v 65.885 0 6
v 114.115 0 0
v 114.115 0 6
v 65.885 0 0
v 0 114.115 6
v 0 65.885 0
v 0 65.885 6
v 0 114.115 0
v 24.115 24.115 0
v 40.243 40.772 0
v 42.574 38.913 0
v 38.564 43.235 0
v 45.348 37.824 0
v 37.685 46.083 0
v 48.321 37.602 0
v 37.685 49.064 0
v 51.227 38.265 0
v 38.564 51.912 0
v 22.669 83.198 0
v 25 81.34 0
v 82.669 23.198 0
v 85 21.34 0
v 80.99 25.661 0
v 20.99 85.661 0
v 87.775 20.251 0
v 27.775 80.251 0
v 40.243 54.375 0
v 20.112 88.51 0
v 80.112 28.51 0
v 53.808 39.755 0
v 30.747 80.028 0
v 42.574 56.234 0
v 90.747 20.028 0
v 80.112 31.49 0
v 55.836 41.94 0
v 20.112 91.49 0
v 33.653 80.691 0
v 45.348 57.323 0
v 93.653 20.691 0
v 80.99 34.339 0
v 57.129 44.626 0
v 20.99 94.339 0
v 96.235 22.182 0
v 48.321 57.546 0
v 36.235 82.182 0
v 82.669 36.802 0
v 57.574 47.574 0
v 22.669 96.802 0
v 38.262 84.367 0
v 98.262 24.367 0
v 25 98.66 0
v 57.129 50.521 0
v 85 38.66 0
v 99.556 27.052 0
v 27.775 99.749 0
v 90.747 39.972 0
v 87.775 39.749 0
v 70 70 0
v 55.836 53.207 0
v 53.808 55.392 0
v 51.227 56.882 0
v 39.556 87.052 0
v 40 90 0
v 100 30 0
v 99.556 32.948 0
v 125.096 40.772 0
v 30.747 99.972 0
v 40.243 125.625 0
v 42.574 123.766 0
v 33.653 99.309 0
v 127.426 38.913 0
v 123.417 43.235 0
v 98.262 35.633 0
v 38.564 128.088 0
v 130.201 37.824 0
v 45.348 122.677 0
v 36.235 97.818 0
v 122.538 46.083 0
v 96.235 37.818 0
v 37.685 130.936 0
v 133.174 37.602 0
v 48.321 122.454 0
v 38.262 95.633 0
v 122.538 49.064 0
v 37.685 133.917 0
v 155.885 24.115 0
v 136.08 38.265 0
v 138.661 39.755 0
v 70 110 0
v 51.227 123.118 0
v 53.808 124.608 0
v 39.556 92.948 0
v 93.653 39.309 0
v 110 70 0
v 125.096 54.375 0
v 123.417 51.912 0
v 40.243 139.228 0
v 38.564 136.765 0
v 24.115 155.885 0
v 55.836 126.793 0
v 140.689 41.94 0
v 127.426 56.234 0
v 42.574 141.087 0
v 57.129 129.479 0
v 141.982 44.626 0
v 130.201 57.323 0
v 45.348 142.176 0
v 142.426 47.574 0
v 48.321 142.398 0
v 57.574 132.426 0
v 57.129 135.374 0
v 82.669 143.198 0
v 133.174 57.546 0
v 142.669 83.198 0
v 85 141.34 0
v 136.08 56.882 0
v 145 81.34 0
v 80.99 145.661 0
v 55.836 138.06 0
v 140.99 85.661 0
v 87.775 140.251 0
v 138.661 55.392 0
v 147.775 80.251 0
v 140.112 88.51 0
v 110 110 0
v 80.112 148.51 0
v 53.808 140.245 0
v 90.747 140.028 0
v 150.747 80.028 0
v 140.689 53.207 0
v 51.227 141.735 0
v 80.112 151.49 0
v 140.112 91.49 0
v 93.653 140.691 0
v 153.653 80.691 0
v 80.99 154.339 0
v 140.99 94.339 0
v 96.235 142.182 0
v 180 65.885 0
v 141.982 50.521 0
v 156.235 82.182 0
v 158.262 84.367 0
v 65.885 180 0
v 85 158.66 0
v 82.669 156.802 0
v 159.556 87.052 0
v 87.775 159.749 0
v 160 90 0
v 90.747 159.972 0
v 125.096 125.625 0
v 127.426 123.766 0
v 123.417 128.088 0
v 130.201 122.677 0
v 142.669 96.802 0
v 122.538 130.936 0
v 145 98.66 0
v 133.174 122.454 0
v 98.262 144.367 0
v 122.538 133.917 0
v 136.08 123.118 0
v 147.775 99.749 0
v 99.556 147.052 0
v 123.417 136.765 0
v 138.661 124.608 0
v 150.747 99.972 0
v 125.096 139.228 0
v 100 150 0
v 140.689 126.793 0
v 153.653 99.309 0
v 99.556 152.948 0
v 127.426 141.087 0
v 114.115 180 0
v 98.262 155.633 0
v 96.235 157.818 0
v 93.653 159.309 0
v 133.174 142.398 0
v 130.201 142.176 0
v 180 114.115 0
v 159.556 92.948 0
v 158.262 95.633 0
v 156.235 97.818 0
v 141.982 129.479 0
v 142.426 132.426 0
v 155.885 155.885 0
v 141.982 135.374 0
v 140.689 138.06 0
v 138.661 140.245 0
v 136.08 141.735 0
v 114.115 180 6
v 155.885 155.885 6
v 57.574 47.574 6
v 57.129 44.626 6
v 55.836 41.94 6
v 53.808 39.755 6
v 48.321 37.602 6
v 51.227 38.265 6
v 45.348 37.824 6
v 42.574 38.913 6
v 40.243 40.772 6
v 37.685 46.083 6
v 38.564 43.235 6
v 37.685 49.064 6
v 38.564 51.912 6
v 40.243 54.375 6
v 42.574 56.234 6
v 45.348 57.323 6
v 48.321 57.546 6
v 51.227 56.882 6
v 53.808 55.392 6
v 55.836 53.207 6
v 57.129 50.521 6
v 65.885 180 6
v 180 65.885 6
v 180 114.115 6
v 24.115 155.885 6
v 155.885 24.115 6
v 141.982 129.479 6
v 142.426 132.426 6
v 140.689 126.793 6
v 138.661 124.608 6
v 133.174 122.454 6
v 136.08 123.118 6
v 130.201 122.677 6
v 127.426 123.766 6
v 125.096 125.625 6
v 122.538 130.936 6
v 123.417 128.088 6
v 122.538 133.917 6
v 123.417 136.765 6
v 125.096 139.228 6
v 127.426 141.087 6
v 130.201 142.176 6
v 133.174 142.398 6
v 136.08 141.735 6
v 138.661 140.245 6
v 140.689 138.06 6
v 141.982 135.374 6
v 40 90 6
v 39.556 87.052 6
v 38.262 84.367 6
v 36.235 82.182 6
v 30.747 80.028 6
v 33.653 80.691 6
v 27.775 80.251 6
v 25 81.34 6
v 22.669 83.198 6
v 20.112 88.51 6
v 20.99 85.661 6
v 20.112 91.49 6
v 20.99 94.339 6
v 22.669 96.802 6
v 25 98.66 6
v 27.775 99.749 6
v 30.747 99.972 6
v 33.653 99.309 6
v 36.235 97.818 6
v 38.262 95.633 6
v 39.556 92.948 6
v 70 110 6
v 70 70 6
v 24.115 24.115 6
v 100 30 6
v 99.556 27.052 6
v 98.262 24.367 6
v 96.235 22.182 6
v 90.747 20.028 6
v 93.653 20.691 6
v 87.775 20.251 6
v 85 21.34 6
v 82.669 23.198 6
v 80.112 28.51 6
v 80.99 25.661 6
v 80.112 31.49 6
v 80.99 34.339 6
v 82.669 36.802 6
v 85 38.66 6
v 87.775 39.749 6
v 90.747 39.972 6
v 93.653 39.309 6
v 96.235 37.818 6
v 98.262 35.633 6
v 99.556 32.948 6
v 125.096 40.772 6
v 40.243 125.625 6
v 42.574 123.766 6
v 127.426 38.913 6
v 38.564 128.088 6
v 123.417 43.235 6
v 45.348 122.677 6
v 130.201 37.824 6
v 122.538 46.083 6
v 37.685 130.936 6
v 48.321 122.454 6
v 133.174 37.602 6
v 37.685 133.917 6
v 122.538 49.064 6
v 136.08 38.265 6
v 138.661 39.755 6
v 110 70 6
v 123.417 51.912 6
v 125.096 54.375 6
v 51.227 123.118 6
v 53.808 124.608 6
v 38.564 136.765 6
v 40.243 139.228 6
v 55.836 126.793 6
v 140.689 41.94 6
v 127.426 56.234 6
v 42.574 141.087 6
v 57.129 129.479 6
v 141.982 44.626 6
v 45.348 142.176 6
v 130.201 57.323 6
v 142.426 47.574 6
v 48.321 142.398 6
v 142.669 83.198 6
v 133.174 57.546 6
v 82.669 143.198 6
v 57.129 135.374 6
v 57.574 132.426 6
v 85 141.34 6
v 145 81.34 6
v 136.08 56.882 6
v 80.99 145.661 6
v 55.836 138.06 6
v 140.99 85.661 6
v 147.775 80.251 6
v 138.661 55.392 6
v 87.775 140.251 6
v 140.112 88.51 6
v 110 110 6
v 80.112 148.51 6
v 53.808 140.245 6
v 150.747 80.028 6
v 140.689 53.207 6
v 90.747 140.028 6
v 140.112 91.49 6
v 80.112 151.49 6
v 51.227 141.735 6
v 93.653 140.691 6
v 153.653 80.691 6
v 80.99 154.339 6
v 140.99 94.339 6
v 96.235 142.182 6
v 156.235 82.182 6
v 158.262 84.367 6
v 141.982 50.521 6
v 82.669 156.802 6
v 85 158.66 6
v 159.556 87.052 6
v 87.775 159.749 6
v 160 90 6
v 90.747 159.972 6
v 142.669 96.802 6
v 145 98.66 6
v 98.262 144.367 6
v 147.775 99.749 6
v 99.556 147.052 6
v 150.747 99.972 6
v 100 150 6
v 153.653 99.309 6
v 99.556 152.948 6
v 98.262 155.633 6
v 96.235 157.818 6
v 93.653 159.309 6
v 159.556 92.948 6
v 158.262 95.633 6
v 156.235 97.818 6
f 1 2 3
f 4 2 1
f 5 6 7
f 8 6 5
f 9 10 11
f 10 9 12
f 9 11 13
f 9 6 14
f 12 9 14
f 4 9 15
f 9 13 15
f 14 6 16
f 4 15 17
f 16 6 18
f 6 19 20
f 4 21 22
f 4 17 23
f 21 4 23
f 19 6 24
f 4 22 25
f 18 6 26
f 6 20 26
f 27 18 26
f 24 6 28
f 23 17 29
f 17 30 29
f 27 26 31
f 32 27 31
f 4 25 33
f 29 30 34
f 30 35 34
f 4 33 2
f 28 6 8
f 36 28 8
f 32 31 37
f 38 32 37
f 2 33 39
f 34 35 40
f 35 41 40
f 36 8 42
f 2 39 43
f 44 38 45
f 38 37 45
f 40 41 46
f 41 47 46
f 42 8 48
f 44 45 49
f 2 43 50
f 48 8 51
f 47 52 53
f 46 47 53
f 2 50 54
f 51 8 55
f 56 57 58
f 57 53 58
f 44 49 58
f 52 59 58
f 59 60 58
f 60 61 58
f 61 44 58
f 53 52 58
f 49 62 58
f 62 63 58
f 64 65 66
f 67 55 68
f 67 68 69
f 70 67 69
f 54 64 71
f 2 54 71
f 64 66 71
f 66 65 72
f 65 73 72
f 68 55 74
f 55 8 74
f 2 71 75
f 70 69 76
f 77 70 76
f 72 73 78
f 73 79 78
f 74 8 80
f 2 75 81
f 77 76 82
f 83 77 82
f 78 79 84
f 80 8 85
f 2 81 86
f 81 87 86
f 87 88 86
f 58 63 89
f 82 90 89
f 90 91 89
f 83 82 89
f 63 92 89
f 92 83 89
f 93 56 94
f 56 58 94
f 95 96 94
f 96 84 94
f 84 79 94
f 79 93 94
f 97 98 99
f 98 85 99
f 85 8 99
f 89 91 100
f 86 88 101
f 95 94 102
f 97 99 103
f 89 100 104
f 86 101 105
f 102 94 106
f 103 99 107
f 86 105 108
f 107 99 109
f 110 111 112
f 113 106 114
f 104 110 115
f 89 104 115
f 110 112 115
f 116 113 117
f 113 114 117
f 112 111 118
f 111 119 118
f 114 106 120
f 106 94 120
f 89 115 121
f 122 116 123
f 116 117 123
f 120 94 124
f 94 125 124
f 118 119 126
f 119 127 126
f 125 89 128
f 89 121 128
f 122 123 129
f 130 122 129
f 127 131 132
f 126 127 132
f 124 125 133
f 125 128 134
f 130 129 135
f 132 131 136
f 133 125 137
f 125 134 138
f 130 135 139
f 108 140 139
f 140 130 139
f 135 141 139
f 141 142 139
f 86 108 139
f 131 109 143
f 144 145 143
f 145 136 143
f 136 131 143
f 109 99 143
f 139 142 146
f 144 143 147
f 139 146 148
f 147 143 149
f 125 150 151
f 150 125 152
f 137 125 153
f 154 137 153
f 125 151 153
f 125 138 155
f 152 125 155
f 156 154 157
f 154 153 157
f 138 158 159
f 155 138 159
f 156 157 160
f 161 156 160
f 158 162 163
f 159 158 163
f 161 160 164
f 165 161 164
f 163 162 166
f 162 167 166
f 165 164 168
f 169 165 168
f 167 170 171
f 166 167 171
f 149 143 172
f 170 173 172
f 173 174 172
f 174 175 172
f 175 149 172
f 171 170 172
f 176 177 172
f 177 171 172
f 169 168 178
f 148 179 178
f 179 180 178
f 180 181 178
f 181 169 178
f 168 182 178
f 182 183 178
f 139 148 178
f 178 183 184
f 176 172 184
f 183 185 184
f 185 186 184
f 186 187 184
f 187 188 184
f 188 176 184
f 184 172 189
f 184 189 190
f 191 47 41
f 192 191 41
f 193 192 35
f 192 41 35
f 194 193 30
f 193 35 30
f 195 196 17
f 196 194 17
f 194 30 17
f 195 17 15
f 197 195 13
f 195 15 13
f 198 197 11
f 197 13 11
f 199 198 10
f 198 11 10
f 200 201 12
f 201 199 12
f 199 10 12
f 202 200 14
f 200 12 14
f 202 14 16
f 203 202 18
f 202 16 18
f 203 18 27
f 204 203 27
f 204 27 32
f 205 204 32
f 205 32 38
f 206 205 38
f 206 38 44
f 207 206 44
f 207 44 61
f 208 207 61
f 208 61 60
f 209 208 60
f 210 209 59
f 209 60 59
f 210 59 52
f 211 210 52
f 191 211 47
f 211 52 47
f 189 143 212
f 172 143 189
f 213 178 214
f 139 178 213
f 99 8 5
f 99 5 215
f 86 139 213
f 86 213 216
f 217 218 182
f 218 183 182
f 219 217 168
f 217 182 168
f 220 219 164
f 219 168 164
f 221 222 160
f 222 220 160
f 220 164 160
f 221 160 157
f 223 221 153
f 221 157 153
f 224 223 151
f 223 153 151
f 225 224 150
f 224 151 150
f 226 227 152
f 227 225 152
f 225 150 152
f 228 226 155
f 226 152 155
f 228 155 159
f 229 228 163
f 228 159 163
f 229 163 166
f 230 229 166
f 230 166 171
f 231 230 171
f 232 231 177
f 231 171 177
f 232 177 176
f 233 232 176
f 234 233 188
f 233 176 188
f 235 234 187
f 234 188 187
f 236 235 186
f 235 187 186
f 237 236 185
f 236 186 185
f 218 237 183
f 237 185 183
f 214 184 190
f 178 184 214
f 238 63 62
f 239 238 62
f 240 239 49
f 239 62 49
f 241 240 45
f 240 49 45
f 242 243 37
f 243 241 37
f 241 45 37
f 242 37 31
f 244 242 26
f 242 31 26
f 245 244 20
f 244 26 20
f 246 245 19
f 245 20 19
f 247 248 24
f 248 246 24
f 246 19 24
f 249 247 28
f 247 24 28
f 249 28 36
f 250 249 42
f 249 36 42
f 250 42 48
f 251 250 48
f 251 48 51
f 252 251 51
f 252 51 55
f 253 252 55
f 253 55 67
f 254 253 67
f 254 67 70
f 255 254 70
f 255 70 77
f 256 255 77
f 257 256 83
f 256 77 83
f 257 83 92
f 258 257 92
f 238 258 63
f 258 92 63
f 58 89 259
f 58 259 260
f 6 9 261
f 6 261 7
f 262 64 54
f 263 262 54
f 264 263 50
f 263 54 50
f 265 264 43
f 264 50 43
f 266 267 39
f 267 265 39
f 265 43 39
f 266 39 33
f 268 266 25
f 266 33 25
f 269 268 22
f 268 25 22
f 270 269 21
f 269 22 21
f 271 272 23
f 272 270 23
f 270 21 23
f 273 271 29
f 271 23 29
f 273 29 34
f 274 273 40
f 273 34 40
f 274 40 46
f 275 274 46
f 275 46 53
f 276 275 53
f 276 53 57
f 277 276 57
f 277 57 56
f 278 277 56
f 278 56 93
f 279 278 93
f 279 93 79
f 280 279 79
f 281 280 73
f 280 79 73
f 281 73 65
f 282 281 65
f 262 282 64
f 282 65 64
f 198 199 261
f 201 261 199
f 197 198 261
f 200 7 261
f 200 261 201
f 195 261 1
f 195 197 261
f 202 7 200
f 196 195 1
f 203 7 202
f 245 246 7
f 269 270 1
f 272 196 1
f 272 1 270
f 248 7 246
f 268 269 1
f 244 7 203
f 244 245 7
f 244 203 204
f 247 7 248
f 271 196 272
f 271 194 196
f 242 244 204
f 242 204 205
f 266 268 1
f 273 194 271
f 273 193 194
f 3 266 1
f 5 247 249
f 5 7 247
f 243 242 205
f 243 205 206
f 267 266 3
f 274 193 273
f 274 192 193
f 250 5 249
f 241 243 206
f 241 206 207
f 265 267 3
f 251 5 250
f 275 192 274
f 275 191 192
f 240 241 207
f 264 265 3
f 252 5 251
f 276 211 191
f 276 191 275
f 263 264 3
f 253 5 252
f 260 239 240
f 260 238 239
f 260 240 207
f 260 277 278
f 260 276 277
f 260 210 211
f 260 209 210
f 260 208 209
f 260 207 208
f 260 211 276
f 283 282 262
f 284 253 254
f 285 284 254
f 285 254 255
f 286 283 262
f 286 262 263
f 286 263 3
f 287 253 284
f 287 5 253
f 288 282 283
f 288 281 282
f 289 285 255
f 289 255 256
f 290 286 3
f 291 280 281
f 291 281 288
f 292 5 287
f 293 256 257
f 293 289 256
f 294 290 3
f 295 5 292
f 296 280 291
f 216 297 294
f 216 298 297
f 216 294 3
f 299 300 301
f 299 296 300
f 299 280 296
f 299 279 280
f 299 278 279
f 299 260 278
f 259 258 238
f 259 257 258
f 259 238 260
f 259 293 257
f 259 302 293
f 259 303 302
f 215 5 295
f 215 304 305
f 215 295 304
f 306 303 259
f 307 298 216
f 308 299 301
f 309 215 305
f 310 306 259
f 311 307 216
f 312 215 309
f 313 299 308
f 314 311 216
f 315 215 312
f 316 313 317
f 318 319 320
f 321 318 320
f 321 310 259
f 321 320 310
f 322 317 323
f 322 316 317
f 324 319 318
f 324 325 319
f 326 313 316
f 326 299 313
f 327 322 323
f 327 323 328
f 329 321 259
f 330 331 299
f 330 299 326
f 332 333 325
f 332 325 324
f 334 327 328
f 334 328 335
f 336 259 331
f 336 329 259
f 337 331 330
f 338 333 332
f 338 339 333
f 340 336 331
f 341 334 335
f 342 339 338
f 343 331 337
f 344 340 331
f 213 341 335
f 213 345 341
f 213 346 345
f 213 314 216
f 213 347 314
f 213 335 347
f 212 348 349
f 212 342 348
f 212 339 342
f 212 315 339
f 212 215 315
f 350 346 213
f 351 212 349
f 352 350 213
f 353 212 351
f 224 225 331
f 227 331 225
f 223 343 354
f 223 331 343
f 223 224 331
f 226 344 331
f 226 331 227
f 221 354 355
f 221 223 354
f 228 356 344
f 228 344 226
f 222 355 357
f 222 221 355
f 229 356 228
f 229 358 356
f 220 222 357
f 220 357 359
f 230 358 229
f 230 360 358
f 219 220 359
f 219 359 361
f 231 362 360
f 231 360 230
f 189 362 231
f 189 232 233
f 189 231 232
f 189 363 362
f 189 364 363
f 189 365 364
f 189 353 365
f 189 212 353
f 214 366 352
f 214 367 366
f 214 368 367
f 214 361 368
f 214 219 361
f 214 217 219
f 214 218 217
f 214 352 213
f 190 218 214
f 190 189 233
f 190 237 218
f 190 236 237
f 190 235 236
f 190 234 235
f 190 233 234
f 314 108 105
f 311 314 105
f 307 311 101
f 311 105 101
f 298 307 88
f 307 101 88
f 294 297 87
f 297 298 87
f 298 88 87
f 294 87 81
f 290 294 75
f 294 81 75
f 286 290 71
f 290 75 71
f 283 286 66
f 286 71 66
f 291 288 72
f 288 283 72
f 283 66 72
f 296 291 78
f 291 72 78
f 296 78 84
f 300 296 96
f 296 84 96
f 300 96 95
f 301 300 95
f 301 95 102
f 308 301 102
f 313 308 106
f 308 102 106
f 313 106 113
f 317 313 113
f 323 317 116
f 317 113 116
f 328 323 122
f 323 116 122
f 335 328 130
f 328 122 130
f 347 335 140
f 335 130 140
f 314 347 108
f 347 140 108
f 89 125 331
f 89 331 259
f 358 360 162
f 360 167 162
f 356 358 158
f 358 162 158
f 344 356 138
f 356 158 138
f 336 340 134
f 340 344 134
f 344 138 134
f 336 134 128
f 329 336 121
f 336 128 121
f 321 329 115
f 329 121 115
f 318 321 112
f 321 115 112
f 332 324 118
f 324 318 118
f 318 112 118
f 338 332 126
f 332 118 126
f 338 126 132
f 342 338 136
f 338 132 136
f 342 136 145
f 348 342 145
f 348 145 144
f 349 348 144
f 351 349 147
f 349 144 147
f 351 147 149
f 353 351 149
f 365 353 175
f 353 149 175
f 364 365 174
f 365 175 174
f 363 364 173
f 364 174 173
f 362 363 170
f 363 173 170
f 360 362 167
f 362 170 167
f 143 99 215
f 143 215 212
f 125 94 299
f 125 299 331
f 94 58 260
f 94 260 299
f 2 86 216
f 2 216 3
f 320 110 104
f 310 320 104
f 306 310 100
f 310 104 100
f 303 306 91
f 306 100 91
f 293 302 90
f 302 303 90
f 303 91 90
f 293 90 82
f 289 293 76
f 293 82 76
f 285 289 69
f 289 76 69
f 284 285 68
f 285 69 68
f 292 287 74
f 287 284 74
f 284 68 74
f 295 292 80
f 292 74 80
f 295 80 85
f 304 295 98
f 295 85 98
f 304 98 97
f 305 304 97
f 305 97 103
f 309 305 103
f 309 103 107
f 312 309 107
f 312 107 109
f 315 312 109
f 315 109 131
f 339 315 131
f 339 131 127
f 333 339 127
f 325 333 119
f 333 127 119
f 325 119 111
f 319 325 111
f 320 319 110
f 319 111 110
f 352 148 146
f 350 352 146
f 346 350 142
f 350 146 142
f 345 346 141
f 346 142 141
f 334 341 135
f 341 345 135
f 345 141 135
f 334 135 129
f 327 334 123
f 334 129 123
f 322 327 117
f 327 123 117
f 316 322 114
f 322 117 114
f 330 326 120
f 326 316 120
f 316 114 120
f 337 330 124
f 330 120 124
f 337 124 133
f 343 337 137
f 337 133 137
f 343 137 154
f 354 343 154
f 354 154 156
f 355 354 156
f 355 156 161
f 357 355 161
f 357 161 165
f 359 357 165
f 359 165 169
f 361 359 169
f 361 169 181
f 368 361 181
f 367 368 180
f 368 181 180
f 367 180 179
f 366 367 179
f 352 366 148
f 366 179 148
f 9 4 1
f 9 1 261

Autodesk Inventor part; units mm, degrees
ref_plane "YZ Plane" through (0, 0, 0) normal (1, 0, 0) x (0, 1, 0)
ref_plane "XZ Plane" through (0, 0, 0) normal (0, 1, 0) x (-1, 0, 0)
ref_plane "XY Plane" through (0, 0, 0) normal (0, 0, 1) x (1, 0, 0)
sketch "Sketch1" plane through (0, 0, 0) normal (0, 0, 1) x (1, 0, 0)
  line L0 (65.8846, 0) -> (24.1154, 24.1154)
  line L1 (24.1154, 24.1154) -> (0, 65.8846)
  line L2 (0, 65.8846) -> (0, 114.1154)
  line L3 (0, 114.1154) -> (24.1154, 155.8846)
  line L4 (24.1154, 155.8846) -> (65.8846, 180)
  line L5 (65.8846, 180) -> (114.1154, 180)
  line L6 (114.1154, 180) -> (155.8846, 155.8846)
  line L7 (155.8846, 155.8846) -> (180, 114.1154)
  line L8 (180, 114.1154) -> (180, 65.8846)
  line L9 (180, 65.8846) -> (155.8846, 24.1154)
  line L10 (155.8846, 24.1154) -> (114.1154, 0)
  line L11 (114.1154, 0) -> (65.8846, 0)
  line L12 (70, 70) -> (110, 70)
  line L13 (110, 70) -> (110, 110)
  line L14 (110, 110) -> (70, 110)
  line L15 (70, 110) -> (70, 70)
  circle A0 centre (90, 150) radius 10
  circle A1 centre (47.5736, 132.4264) radius 10
  circle A2 centre (132.4264, 132.4264) radius 10
  circle A3 centre (150, 90) radius 10
  circle A4 centre (30, 90) radius 10
  circle A5 centre (47.5736, 47.5736) radius 10
  circle A6 centre (90, 30) radius 10
  circle A7 centre (132.4264, 47.5736) radius 10
  point P0 (0, 0)
  point P1 (90, 90)
  point P2 (90, 90)
  dimension "d1" = 20
  dimension "d2" = 20
extrude "Extrusion1" add sketch "Sketch1" along normal blind 6
properties part number "P2-11"
